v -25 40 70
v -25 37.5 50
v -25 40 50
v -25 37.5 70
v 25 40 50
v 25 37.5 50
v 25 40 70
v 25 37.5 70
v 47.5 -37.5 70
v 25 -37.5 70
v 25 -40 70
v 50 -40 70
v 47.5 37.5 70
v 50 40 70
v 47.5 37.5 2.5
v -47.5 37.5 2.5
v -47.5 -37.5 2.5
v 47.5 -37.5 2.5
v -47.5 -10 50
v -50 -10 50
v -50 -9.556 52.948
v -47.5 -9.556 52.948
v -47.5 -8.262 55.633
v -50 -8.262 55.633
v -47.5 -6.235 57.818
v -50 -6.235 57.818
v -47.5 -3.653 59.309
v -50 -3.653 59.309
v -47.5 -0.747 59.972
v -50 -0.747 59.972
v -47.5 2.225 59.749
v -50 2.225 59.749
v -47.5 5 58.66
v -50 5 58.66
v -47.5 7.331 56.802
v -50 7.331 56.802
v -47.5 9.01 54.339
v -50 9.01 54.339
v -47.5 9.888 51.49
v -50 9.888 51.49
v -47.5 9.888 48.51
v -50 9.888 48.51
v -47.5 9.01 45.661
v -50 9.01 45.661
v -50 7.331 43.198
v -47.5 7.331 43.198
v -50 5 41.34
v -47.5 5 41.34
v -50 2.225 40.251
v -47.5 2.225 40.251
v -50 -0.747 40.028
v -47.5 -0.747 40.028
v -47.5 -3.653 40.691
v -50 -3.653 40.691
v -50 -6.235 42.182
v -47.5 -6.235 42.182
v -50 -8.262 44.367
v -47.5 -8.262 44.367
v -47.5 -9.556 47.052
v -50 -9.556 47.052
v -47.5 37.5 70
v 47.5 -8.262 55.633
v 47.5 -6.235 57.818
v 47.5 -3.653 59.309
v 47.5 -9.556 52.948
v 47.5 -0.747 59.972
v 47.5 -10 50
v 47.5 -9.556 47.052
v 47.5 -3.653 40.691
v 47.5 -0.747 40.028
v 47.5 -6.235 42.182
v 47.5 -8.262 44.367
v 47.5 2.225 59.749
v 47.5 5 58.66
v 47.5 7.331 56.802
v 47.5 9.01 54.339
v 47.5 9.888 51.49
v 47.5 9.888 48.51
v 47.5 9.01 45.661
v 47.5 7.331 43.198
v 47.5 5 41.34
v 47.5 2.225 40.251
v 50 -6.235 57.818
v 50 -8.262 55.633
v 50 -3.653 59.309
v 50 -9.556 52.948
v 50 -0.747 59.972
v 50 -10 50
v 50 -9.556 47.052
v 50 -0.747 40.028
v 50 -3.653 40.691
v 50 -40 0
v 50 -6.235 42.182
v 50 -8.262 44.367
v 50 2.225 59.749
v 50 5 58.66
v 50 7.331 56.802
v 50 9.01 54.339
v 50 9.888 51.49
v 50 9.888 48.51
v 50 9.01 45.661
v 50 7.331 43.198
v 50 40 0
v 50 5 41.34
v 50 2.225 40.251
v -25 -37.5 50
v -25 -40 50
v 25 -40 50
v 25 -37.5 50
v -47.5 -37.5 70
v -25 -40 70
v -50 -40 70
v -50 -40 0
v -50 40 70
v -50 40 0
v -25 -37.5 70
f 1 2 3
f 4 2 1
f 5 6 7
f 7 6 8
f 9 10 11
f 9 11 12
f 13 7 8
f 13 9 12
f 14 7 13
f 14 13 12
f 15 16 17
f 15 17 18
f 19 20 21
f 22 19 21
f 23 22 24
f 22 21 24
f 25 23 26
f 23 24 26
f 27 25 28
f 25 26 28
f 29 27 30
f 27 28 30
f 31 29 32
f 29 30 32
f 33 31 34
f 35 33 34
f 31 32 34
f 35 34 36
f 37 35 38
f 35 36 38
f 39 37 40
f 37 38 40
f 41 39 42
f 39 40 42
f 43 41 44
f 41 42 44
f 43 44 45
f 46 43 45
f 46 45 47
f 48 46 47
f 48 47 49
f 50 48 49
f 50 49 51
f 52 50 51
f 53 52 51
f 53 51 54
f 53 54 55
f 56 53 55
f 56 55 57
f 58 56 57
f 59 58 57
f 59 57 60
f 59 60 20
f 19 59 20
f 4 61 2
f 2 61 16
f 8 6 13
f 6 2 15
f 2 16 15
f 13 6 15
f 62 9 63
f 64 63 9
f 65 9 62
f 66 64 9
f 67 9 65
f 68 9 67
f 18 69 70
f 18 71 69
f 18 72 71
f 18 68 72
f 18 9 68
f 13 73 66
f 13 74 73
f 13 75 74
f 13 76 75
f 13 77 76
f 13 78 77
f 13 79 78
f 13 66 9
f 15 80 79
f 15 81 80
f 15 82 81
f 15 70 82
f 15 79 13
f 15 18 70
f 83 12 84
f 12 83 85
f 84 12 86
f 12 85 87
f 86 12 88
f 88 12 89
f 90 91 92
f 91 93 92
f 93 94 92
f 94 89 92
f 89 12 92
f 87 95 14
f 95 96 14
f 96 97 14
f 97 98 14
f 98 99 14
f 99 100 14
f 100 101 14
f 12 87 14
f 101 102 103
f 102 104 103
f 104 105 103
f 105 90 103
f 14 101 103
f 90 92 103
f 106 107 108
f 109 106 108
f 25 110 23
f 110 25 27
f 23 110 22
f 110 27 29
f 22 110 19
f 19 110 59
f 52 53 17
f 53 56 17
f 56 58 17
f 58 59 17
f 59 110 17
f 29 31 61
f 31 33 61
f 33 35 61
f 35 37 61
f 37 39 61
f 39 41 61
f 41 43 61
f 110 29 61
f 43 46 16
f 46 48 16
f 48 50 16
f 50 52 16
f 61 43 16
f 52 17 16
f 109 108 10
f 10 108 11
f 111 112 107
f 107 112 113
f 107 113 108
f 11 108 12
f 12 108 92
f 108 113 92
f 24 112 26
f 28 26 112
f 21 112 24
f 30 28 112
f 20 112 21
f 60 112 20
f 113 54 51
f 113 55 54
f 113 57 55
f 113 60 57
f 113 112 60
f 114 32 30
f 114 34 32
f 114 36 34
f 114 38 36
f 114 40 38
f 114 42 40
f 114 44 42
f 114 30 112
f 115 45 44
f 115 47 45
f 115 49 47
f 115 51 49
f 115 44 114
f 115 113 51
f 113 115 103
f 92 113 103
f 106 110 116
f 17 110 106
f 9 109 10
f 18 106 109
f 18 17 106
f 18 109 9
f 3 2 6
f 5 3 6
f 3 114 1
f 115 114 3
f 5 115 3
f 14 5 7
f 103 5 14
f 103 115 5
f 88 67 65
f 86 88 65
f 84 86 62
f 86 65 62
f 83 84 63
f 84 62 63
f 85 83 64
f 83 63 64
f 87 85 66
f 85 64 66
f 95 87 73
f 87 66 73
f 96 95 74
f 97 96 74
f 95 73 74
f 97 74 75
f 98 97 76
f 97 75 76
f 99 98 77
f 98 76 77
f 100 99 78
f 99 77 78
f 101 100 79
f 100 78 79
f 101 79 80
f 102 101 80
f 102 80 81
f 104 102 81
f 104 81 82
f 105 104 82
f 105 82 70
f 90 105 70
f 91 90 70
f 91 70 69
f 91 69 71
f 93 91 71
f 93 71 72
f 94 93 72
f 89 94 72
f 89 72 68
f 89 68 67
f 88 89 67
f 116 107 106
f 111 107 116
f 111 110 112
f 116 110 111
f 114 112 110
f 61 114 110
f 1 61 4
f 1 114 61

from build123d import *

# Parameters (mm, degrees)
F0_W     = 100
F0_H     = 80
F1_DEPTH = 70
F2_T     = -2.5
F3_W     = 50
F3_H     = 20
F4_DEPTH = 80.001
F5_R     = 10
F6_DEPTH = 100.001


with BuildPart() as f1:
    # F0 (on Top) → F1 (new body)
    with BuildSketch(Plane.XY):
        Rectangle(F0_W, F0_H)
    extrude(amount=F1_DEPTH)

    # F2
    f2_openings = [f1.faces().sort_by_distance(p)[0] for p in [
        (0, 0, 70),
    ]]
    offset(amount=F2_T, openings=f2_openings)

    # F3 (on face) → F4 (cut, through all)
    with BuildSketch(Plane.XZ.offset(40)):
        with Locations((0, 60)):
            Rectangle(F3_W, F3_H)
    extrude(amount=-F4_DEPTH, mode=Mode.SUBTRACT)

    # F5 (on face) → F6 (cut, through all)
    with BuildSketch(Plane(origin=(-50, 0, 0), x_dir=(0, -1, 0), z_dir=(-1, 0, 0))):
        with Locations((0, 50)):
            Circle(F5_R)
    extrude(amount=-F6_DEPTH, mode=Mode.SUBTRACT)


solid = f1.part
